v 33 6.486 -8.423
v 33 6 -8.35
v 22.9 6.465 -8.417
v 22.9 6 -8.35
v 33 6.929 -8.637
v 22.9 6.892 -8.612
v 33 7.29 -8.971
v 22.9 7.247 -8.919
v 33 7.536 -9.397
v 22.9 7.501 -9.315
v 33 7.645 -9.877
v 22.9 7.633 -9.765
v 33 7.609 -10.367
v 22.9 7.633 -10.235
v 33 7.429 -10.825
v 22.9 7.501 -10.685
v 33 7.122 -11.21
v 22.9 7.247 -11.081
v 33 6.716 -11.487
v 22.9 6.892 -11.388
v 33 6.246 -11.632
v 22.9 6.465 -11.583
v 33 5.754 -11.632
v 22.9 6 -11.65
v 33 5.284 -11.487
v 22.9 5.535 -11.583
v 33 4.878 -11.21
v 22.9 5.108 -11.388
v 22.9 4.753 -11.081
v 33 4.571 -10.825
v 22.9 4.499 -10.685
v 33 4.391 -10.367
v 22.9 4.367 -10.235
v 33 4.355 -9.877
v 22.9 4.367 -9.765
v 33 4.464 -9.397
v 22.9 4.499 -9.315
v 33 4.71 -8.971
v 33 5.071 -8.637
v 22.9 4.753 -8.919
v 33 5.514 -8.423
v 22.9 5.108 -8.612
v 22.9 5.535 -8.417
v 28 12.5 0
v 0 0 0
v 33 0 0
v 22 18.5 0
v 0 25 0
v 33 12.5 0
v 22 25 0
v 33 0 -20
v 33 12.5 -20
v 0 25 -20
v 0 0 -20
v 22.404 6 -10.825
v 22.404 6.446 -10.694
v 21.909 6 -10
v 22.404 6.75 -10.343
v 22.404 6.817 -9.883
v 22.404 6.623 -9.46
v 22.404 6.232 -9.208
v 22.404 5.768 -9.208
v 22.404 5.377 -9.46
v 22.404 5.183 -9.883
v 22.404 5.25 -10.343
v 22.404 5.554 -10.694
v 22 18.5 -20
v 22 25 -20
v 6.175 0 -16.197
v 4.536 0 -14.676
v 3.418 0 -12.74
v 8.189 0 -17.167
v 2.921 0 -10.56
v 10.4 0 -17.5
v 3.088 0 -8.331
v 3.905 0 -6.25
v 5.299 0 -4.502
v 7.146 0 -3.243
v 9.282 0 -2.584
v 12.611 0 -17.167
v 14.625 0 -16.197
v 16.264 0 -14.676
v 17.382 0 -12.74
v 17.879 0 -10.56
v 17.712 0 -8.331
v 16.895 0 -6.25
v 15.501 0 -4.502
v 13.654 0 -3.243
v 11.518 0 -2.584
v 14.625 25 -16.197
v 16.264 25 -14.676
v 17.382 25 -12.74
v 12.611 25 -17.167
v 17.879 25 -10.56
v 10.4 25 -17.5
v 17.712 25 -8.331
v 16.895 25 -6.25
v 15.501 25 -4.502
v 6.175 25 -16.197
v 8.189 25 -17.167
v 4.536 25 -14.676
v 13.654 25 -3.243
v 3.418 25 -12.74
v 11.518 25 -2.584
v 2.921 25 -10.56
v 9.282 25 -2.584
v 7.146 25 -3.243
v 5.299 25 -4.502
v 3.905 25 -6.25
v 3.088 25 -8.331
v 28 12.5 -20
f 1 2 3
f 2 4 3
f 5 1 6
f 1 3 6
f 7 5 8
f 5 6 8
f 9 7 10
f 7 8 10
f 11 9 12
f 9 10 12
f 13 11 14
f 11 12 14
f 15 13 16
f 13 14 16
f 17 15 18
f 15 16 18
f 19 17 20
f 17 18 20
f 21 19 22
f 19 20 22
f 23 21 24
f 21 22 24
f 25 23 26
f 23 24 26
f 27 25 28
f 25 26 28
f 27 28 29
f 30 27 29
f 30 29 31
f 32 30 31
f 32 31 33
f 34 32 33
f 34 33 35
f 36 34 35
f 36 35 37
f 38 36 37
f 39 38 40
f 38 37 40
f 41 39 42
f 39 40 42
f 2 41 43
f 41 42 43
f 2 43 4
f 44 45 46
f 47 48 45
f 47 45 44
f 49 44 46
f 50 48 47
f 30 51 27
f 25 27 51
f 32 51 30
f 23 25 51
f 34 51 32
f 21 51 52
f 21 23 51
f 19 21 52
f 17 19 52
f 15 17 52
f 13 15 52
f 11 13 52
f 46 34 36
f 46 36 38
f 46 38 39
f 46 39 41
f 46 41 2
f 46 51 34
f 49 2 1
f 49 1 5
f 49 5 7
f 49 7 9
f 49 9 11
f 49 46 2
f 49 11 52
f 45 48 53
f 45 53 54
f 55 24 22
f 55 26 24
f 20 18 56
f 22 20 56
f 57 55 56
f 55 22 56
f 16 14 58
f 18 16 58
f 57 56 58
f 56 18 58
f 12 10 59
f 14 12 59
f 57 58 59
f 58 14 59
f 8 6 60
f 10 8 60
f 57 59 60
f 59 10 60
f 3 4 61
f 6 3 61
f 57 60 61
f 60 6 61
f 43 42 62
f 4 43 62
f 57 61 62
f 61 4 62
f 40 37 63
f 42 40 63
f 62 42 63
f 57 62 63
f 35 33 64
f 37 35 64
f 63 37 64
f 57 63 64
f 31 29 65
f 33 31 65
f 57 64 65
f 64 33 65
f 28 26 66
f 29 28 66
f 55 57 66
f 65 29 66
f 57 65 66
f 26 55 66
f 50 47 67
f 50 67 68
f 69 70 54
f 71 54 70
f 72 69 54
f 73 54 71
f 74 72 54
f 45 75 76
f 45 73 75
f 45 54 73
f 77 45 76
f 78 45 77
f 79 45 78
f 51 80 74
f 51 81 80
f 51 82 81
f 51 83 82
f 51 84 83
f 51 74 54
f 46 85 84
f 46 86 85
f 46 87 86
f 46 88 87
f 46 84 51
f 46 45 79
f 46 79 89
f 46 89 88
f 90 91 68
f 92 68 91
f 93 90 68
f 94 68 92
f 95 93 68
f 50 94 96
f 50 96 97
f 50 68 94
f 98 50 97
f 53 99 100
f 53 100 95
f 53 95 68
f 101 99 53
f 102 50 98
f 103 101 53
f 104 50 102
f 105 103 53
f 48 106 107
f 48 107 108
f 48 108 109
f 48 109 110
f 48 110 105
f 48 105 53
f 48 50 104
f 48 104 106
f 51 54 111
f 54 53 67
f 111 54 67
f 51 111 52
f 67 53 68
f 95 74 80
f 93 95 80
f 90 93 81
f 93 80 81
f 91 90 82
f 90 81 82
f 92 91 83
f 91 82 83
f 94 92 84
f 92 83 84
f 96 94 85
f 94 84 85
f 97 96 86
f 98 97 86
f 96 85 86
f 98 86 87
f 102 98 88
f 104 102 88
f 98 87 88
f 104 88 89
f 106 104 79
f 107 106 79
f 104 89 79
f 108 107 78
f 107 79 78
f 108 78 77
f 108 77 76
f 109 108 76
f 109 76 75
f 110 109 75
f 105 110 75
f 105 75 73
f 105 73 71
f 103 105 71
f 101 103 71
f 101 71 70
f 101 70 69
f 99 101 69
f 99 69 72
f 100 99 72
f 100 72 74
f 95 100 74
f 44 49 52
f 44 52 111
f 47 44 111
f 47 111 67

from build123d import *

# Parameters (mm, degrees)
ESTRUSIONE_ESTRUSIONE1_DEPTH = 20
SCHIZZO2_R                   = 7.5
TAGLIO_ESTRUSIONE1_DEPTH     = 46.97825573
FORO_FILETTATO_M4_1_D        = 3.3
FORO_FILETTATO_M4_1_DEPTH    = 10.1
FORO_FILETTATO_M4_1_TIP      = 0.991420021


with BuildPart() as part:
    # Schizzo1 → Estrusione-Estrusione1 (new body)
    with BuildSketch(Plane.XY):
        Polygon((0, 0), (33, 0), (33, 12.5), (28, 12.5), (22, 18.5), (22, 25), (0, 25), align=None)
    extrude(amount=-ESTRUSIONE_ESTRUSIONE1_DEPTH)

    # Schizzo2 → Taglio-Estrusione1 (cut, through all)
    with BuildSketch(Plane.XZ):
        with Locations((10.4, -10)):
            Circle(SCHIZZO2_R)
    extrude(amount=-TAGLIO_ESTRUSIONE1_DEPTH, mode=Mode.SUBTRACT)

    # Foro filettato M4-1
    with Locations(Plane(origin=(33, 0, 0), x_dir=(0, 0, -1), z_dir=(1, 0, 0))):
        with Locations((10, 6)):
            Hole(FORO_FILETTATO_M4_1_D / 2, depth=FORO_FILETTATO_M4_1_DEPTH)
            with Locations((0, 0, -(FORO_FILETTATO_M4_1_DEPTH + FORO_FILETTATO_M4_1_TIP / 2))):  # 118° drill point
                Cone(0, FORO_FILETTATO_M4_1_D / 2, FORO_FILETTATO_M4_1_TIP, mode=Mode.SUBTRACT)


solid = part.part
